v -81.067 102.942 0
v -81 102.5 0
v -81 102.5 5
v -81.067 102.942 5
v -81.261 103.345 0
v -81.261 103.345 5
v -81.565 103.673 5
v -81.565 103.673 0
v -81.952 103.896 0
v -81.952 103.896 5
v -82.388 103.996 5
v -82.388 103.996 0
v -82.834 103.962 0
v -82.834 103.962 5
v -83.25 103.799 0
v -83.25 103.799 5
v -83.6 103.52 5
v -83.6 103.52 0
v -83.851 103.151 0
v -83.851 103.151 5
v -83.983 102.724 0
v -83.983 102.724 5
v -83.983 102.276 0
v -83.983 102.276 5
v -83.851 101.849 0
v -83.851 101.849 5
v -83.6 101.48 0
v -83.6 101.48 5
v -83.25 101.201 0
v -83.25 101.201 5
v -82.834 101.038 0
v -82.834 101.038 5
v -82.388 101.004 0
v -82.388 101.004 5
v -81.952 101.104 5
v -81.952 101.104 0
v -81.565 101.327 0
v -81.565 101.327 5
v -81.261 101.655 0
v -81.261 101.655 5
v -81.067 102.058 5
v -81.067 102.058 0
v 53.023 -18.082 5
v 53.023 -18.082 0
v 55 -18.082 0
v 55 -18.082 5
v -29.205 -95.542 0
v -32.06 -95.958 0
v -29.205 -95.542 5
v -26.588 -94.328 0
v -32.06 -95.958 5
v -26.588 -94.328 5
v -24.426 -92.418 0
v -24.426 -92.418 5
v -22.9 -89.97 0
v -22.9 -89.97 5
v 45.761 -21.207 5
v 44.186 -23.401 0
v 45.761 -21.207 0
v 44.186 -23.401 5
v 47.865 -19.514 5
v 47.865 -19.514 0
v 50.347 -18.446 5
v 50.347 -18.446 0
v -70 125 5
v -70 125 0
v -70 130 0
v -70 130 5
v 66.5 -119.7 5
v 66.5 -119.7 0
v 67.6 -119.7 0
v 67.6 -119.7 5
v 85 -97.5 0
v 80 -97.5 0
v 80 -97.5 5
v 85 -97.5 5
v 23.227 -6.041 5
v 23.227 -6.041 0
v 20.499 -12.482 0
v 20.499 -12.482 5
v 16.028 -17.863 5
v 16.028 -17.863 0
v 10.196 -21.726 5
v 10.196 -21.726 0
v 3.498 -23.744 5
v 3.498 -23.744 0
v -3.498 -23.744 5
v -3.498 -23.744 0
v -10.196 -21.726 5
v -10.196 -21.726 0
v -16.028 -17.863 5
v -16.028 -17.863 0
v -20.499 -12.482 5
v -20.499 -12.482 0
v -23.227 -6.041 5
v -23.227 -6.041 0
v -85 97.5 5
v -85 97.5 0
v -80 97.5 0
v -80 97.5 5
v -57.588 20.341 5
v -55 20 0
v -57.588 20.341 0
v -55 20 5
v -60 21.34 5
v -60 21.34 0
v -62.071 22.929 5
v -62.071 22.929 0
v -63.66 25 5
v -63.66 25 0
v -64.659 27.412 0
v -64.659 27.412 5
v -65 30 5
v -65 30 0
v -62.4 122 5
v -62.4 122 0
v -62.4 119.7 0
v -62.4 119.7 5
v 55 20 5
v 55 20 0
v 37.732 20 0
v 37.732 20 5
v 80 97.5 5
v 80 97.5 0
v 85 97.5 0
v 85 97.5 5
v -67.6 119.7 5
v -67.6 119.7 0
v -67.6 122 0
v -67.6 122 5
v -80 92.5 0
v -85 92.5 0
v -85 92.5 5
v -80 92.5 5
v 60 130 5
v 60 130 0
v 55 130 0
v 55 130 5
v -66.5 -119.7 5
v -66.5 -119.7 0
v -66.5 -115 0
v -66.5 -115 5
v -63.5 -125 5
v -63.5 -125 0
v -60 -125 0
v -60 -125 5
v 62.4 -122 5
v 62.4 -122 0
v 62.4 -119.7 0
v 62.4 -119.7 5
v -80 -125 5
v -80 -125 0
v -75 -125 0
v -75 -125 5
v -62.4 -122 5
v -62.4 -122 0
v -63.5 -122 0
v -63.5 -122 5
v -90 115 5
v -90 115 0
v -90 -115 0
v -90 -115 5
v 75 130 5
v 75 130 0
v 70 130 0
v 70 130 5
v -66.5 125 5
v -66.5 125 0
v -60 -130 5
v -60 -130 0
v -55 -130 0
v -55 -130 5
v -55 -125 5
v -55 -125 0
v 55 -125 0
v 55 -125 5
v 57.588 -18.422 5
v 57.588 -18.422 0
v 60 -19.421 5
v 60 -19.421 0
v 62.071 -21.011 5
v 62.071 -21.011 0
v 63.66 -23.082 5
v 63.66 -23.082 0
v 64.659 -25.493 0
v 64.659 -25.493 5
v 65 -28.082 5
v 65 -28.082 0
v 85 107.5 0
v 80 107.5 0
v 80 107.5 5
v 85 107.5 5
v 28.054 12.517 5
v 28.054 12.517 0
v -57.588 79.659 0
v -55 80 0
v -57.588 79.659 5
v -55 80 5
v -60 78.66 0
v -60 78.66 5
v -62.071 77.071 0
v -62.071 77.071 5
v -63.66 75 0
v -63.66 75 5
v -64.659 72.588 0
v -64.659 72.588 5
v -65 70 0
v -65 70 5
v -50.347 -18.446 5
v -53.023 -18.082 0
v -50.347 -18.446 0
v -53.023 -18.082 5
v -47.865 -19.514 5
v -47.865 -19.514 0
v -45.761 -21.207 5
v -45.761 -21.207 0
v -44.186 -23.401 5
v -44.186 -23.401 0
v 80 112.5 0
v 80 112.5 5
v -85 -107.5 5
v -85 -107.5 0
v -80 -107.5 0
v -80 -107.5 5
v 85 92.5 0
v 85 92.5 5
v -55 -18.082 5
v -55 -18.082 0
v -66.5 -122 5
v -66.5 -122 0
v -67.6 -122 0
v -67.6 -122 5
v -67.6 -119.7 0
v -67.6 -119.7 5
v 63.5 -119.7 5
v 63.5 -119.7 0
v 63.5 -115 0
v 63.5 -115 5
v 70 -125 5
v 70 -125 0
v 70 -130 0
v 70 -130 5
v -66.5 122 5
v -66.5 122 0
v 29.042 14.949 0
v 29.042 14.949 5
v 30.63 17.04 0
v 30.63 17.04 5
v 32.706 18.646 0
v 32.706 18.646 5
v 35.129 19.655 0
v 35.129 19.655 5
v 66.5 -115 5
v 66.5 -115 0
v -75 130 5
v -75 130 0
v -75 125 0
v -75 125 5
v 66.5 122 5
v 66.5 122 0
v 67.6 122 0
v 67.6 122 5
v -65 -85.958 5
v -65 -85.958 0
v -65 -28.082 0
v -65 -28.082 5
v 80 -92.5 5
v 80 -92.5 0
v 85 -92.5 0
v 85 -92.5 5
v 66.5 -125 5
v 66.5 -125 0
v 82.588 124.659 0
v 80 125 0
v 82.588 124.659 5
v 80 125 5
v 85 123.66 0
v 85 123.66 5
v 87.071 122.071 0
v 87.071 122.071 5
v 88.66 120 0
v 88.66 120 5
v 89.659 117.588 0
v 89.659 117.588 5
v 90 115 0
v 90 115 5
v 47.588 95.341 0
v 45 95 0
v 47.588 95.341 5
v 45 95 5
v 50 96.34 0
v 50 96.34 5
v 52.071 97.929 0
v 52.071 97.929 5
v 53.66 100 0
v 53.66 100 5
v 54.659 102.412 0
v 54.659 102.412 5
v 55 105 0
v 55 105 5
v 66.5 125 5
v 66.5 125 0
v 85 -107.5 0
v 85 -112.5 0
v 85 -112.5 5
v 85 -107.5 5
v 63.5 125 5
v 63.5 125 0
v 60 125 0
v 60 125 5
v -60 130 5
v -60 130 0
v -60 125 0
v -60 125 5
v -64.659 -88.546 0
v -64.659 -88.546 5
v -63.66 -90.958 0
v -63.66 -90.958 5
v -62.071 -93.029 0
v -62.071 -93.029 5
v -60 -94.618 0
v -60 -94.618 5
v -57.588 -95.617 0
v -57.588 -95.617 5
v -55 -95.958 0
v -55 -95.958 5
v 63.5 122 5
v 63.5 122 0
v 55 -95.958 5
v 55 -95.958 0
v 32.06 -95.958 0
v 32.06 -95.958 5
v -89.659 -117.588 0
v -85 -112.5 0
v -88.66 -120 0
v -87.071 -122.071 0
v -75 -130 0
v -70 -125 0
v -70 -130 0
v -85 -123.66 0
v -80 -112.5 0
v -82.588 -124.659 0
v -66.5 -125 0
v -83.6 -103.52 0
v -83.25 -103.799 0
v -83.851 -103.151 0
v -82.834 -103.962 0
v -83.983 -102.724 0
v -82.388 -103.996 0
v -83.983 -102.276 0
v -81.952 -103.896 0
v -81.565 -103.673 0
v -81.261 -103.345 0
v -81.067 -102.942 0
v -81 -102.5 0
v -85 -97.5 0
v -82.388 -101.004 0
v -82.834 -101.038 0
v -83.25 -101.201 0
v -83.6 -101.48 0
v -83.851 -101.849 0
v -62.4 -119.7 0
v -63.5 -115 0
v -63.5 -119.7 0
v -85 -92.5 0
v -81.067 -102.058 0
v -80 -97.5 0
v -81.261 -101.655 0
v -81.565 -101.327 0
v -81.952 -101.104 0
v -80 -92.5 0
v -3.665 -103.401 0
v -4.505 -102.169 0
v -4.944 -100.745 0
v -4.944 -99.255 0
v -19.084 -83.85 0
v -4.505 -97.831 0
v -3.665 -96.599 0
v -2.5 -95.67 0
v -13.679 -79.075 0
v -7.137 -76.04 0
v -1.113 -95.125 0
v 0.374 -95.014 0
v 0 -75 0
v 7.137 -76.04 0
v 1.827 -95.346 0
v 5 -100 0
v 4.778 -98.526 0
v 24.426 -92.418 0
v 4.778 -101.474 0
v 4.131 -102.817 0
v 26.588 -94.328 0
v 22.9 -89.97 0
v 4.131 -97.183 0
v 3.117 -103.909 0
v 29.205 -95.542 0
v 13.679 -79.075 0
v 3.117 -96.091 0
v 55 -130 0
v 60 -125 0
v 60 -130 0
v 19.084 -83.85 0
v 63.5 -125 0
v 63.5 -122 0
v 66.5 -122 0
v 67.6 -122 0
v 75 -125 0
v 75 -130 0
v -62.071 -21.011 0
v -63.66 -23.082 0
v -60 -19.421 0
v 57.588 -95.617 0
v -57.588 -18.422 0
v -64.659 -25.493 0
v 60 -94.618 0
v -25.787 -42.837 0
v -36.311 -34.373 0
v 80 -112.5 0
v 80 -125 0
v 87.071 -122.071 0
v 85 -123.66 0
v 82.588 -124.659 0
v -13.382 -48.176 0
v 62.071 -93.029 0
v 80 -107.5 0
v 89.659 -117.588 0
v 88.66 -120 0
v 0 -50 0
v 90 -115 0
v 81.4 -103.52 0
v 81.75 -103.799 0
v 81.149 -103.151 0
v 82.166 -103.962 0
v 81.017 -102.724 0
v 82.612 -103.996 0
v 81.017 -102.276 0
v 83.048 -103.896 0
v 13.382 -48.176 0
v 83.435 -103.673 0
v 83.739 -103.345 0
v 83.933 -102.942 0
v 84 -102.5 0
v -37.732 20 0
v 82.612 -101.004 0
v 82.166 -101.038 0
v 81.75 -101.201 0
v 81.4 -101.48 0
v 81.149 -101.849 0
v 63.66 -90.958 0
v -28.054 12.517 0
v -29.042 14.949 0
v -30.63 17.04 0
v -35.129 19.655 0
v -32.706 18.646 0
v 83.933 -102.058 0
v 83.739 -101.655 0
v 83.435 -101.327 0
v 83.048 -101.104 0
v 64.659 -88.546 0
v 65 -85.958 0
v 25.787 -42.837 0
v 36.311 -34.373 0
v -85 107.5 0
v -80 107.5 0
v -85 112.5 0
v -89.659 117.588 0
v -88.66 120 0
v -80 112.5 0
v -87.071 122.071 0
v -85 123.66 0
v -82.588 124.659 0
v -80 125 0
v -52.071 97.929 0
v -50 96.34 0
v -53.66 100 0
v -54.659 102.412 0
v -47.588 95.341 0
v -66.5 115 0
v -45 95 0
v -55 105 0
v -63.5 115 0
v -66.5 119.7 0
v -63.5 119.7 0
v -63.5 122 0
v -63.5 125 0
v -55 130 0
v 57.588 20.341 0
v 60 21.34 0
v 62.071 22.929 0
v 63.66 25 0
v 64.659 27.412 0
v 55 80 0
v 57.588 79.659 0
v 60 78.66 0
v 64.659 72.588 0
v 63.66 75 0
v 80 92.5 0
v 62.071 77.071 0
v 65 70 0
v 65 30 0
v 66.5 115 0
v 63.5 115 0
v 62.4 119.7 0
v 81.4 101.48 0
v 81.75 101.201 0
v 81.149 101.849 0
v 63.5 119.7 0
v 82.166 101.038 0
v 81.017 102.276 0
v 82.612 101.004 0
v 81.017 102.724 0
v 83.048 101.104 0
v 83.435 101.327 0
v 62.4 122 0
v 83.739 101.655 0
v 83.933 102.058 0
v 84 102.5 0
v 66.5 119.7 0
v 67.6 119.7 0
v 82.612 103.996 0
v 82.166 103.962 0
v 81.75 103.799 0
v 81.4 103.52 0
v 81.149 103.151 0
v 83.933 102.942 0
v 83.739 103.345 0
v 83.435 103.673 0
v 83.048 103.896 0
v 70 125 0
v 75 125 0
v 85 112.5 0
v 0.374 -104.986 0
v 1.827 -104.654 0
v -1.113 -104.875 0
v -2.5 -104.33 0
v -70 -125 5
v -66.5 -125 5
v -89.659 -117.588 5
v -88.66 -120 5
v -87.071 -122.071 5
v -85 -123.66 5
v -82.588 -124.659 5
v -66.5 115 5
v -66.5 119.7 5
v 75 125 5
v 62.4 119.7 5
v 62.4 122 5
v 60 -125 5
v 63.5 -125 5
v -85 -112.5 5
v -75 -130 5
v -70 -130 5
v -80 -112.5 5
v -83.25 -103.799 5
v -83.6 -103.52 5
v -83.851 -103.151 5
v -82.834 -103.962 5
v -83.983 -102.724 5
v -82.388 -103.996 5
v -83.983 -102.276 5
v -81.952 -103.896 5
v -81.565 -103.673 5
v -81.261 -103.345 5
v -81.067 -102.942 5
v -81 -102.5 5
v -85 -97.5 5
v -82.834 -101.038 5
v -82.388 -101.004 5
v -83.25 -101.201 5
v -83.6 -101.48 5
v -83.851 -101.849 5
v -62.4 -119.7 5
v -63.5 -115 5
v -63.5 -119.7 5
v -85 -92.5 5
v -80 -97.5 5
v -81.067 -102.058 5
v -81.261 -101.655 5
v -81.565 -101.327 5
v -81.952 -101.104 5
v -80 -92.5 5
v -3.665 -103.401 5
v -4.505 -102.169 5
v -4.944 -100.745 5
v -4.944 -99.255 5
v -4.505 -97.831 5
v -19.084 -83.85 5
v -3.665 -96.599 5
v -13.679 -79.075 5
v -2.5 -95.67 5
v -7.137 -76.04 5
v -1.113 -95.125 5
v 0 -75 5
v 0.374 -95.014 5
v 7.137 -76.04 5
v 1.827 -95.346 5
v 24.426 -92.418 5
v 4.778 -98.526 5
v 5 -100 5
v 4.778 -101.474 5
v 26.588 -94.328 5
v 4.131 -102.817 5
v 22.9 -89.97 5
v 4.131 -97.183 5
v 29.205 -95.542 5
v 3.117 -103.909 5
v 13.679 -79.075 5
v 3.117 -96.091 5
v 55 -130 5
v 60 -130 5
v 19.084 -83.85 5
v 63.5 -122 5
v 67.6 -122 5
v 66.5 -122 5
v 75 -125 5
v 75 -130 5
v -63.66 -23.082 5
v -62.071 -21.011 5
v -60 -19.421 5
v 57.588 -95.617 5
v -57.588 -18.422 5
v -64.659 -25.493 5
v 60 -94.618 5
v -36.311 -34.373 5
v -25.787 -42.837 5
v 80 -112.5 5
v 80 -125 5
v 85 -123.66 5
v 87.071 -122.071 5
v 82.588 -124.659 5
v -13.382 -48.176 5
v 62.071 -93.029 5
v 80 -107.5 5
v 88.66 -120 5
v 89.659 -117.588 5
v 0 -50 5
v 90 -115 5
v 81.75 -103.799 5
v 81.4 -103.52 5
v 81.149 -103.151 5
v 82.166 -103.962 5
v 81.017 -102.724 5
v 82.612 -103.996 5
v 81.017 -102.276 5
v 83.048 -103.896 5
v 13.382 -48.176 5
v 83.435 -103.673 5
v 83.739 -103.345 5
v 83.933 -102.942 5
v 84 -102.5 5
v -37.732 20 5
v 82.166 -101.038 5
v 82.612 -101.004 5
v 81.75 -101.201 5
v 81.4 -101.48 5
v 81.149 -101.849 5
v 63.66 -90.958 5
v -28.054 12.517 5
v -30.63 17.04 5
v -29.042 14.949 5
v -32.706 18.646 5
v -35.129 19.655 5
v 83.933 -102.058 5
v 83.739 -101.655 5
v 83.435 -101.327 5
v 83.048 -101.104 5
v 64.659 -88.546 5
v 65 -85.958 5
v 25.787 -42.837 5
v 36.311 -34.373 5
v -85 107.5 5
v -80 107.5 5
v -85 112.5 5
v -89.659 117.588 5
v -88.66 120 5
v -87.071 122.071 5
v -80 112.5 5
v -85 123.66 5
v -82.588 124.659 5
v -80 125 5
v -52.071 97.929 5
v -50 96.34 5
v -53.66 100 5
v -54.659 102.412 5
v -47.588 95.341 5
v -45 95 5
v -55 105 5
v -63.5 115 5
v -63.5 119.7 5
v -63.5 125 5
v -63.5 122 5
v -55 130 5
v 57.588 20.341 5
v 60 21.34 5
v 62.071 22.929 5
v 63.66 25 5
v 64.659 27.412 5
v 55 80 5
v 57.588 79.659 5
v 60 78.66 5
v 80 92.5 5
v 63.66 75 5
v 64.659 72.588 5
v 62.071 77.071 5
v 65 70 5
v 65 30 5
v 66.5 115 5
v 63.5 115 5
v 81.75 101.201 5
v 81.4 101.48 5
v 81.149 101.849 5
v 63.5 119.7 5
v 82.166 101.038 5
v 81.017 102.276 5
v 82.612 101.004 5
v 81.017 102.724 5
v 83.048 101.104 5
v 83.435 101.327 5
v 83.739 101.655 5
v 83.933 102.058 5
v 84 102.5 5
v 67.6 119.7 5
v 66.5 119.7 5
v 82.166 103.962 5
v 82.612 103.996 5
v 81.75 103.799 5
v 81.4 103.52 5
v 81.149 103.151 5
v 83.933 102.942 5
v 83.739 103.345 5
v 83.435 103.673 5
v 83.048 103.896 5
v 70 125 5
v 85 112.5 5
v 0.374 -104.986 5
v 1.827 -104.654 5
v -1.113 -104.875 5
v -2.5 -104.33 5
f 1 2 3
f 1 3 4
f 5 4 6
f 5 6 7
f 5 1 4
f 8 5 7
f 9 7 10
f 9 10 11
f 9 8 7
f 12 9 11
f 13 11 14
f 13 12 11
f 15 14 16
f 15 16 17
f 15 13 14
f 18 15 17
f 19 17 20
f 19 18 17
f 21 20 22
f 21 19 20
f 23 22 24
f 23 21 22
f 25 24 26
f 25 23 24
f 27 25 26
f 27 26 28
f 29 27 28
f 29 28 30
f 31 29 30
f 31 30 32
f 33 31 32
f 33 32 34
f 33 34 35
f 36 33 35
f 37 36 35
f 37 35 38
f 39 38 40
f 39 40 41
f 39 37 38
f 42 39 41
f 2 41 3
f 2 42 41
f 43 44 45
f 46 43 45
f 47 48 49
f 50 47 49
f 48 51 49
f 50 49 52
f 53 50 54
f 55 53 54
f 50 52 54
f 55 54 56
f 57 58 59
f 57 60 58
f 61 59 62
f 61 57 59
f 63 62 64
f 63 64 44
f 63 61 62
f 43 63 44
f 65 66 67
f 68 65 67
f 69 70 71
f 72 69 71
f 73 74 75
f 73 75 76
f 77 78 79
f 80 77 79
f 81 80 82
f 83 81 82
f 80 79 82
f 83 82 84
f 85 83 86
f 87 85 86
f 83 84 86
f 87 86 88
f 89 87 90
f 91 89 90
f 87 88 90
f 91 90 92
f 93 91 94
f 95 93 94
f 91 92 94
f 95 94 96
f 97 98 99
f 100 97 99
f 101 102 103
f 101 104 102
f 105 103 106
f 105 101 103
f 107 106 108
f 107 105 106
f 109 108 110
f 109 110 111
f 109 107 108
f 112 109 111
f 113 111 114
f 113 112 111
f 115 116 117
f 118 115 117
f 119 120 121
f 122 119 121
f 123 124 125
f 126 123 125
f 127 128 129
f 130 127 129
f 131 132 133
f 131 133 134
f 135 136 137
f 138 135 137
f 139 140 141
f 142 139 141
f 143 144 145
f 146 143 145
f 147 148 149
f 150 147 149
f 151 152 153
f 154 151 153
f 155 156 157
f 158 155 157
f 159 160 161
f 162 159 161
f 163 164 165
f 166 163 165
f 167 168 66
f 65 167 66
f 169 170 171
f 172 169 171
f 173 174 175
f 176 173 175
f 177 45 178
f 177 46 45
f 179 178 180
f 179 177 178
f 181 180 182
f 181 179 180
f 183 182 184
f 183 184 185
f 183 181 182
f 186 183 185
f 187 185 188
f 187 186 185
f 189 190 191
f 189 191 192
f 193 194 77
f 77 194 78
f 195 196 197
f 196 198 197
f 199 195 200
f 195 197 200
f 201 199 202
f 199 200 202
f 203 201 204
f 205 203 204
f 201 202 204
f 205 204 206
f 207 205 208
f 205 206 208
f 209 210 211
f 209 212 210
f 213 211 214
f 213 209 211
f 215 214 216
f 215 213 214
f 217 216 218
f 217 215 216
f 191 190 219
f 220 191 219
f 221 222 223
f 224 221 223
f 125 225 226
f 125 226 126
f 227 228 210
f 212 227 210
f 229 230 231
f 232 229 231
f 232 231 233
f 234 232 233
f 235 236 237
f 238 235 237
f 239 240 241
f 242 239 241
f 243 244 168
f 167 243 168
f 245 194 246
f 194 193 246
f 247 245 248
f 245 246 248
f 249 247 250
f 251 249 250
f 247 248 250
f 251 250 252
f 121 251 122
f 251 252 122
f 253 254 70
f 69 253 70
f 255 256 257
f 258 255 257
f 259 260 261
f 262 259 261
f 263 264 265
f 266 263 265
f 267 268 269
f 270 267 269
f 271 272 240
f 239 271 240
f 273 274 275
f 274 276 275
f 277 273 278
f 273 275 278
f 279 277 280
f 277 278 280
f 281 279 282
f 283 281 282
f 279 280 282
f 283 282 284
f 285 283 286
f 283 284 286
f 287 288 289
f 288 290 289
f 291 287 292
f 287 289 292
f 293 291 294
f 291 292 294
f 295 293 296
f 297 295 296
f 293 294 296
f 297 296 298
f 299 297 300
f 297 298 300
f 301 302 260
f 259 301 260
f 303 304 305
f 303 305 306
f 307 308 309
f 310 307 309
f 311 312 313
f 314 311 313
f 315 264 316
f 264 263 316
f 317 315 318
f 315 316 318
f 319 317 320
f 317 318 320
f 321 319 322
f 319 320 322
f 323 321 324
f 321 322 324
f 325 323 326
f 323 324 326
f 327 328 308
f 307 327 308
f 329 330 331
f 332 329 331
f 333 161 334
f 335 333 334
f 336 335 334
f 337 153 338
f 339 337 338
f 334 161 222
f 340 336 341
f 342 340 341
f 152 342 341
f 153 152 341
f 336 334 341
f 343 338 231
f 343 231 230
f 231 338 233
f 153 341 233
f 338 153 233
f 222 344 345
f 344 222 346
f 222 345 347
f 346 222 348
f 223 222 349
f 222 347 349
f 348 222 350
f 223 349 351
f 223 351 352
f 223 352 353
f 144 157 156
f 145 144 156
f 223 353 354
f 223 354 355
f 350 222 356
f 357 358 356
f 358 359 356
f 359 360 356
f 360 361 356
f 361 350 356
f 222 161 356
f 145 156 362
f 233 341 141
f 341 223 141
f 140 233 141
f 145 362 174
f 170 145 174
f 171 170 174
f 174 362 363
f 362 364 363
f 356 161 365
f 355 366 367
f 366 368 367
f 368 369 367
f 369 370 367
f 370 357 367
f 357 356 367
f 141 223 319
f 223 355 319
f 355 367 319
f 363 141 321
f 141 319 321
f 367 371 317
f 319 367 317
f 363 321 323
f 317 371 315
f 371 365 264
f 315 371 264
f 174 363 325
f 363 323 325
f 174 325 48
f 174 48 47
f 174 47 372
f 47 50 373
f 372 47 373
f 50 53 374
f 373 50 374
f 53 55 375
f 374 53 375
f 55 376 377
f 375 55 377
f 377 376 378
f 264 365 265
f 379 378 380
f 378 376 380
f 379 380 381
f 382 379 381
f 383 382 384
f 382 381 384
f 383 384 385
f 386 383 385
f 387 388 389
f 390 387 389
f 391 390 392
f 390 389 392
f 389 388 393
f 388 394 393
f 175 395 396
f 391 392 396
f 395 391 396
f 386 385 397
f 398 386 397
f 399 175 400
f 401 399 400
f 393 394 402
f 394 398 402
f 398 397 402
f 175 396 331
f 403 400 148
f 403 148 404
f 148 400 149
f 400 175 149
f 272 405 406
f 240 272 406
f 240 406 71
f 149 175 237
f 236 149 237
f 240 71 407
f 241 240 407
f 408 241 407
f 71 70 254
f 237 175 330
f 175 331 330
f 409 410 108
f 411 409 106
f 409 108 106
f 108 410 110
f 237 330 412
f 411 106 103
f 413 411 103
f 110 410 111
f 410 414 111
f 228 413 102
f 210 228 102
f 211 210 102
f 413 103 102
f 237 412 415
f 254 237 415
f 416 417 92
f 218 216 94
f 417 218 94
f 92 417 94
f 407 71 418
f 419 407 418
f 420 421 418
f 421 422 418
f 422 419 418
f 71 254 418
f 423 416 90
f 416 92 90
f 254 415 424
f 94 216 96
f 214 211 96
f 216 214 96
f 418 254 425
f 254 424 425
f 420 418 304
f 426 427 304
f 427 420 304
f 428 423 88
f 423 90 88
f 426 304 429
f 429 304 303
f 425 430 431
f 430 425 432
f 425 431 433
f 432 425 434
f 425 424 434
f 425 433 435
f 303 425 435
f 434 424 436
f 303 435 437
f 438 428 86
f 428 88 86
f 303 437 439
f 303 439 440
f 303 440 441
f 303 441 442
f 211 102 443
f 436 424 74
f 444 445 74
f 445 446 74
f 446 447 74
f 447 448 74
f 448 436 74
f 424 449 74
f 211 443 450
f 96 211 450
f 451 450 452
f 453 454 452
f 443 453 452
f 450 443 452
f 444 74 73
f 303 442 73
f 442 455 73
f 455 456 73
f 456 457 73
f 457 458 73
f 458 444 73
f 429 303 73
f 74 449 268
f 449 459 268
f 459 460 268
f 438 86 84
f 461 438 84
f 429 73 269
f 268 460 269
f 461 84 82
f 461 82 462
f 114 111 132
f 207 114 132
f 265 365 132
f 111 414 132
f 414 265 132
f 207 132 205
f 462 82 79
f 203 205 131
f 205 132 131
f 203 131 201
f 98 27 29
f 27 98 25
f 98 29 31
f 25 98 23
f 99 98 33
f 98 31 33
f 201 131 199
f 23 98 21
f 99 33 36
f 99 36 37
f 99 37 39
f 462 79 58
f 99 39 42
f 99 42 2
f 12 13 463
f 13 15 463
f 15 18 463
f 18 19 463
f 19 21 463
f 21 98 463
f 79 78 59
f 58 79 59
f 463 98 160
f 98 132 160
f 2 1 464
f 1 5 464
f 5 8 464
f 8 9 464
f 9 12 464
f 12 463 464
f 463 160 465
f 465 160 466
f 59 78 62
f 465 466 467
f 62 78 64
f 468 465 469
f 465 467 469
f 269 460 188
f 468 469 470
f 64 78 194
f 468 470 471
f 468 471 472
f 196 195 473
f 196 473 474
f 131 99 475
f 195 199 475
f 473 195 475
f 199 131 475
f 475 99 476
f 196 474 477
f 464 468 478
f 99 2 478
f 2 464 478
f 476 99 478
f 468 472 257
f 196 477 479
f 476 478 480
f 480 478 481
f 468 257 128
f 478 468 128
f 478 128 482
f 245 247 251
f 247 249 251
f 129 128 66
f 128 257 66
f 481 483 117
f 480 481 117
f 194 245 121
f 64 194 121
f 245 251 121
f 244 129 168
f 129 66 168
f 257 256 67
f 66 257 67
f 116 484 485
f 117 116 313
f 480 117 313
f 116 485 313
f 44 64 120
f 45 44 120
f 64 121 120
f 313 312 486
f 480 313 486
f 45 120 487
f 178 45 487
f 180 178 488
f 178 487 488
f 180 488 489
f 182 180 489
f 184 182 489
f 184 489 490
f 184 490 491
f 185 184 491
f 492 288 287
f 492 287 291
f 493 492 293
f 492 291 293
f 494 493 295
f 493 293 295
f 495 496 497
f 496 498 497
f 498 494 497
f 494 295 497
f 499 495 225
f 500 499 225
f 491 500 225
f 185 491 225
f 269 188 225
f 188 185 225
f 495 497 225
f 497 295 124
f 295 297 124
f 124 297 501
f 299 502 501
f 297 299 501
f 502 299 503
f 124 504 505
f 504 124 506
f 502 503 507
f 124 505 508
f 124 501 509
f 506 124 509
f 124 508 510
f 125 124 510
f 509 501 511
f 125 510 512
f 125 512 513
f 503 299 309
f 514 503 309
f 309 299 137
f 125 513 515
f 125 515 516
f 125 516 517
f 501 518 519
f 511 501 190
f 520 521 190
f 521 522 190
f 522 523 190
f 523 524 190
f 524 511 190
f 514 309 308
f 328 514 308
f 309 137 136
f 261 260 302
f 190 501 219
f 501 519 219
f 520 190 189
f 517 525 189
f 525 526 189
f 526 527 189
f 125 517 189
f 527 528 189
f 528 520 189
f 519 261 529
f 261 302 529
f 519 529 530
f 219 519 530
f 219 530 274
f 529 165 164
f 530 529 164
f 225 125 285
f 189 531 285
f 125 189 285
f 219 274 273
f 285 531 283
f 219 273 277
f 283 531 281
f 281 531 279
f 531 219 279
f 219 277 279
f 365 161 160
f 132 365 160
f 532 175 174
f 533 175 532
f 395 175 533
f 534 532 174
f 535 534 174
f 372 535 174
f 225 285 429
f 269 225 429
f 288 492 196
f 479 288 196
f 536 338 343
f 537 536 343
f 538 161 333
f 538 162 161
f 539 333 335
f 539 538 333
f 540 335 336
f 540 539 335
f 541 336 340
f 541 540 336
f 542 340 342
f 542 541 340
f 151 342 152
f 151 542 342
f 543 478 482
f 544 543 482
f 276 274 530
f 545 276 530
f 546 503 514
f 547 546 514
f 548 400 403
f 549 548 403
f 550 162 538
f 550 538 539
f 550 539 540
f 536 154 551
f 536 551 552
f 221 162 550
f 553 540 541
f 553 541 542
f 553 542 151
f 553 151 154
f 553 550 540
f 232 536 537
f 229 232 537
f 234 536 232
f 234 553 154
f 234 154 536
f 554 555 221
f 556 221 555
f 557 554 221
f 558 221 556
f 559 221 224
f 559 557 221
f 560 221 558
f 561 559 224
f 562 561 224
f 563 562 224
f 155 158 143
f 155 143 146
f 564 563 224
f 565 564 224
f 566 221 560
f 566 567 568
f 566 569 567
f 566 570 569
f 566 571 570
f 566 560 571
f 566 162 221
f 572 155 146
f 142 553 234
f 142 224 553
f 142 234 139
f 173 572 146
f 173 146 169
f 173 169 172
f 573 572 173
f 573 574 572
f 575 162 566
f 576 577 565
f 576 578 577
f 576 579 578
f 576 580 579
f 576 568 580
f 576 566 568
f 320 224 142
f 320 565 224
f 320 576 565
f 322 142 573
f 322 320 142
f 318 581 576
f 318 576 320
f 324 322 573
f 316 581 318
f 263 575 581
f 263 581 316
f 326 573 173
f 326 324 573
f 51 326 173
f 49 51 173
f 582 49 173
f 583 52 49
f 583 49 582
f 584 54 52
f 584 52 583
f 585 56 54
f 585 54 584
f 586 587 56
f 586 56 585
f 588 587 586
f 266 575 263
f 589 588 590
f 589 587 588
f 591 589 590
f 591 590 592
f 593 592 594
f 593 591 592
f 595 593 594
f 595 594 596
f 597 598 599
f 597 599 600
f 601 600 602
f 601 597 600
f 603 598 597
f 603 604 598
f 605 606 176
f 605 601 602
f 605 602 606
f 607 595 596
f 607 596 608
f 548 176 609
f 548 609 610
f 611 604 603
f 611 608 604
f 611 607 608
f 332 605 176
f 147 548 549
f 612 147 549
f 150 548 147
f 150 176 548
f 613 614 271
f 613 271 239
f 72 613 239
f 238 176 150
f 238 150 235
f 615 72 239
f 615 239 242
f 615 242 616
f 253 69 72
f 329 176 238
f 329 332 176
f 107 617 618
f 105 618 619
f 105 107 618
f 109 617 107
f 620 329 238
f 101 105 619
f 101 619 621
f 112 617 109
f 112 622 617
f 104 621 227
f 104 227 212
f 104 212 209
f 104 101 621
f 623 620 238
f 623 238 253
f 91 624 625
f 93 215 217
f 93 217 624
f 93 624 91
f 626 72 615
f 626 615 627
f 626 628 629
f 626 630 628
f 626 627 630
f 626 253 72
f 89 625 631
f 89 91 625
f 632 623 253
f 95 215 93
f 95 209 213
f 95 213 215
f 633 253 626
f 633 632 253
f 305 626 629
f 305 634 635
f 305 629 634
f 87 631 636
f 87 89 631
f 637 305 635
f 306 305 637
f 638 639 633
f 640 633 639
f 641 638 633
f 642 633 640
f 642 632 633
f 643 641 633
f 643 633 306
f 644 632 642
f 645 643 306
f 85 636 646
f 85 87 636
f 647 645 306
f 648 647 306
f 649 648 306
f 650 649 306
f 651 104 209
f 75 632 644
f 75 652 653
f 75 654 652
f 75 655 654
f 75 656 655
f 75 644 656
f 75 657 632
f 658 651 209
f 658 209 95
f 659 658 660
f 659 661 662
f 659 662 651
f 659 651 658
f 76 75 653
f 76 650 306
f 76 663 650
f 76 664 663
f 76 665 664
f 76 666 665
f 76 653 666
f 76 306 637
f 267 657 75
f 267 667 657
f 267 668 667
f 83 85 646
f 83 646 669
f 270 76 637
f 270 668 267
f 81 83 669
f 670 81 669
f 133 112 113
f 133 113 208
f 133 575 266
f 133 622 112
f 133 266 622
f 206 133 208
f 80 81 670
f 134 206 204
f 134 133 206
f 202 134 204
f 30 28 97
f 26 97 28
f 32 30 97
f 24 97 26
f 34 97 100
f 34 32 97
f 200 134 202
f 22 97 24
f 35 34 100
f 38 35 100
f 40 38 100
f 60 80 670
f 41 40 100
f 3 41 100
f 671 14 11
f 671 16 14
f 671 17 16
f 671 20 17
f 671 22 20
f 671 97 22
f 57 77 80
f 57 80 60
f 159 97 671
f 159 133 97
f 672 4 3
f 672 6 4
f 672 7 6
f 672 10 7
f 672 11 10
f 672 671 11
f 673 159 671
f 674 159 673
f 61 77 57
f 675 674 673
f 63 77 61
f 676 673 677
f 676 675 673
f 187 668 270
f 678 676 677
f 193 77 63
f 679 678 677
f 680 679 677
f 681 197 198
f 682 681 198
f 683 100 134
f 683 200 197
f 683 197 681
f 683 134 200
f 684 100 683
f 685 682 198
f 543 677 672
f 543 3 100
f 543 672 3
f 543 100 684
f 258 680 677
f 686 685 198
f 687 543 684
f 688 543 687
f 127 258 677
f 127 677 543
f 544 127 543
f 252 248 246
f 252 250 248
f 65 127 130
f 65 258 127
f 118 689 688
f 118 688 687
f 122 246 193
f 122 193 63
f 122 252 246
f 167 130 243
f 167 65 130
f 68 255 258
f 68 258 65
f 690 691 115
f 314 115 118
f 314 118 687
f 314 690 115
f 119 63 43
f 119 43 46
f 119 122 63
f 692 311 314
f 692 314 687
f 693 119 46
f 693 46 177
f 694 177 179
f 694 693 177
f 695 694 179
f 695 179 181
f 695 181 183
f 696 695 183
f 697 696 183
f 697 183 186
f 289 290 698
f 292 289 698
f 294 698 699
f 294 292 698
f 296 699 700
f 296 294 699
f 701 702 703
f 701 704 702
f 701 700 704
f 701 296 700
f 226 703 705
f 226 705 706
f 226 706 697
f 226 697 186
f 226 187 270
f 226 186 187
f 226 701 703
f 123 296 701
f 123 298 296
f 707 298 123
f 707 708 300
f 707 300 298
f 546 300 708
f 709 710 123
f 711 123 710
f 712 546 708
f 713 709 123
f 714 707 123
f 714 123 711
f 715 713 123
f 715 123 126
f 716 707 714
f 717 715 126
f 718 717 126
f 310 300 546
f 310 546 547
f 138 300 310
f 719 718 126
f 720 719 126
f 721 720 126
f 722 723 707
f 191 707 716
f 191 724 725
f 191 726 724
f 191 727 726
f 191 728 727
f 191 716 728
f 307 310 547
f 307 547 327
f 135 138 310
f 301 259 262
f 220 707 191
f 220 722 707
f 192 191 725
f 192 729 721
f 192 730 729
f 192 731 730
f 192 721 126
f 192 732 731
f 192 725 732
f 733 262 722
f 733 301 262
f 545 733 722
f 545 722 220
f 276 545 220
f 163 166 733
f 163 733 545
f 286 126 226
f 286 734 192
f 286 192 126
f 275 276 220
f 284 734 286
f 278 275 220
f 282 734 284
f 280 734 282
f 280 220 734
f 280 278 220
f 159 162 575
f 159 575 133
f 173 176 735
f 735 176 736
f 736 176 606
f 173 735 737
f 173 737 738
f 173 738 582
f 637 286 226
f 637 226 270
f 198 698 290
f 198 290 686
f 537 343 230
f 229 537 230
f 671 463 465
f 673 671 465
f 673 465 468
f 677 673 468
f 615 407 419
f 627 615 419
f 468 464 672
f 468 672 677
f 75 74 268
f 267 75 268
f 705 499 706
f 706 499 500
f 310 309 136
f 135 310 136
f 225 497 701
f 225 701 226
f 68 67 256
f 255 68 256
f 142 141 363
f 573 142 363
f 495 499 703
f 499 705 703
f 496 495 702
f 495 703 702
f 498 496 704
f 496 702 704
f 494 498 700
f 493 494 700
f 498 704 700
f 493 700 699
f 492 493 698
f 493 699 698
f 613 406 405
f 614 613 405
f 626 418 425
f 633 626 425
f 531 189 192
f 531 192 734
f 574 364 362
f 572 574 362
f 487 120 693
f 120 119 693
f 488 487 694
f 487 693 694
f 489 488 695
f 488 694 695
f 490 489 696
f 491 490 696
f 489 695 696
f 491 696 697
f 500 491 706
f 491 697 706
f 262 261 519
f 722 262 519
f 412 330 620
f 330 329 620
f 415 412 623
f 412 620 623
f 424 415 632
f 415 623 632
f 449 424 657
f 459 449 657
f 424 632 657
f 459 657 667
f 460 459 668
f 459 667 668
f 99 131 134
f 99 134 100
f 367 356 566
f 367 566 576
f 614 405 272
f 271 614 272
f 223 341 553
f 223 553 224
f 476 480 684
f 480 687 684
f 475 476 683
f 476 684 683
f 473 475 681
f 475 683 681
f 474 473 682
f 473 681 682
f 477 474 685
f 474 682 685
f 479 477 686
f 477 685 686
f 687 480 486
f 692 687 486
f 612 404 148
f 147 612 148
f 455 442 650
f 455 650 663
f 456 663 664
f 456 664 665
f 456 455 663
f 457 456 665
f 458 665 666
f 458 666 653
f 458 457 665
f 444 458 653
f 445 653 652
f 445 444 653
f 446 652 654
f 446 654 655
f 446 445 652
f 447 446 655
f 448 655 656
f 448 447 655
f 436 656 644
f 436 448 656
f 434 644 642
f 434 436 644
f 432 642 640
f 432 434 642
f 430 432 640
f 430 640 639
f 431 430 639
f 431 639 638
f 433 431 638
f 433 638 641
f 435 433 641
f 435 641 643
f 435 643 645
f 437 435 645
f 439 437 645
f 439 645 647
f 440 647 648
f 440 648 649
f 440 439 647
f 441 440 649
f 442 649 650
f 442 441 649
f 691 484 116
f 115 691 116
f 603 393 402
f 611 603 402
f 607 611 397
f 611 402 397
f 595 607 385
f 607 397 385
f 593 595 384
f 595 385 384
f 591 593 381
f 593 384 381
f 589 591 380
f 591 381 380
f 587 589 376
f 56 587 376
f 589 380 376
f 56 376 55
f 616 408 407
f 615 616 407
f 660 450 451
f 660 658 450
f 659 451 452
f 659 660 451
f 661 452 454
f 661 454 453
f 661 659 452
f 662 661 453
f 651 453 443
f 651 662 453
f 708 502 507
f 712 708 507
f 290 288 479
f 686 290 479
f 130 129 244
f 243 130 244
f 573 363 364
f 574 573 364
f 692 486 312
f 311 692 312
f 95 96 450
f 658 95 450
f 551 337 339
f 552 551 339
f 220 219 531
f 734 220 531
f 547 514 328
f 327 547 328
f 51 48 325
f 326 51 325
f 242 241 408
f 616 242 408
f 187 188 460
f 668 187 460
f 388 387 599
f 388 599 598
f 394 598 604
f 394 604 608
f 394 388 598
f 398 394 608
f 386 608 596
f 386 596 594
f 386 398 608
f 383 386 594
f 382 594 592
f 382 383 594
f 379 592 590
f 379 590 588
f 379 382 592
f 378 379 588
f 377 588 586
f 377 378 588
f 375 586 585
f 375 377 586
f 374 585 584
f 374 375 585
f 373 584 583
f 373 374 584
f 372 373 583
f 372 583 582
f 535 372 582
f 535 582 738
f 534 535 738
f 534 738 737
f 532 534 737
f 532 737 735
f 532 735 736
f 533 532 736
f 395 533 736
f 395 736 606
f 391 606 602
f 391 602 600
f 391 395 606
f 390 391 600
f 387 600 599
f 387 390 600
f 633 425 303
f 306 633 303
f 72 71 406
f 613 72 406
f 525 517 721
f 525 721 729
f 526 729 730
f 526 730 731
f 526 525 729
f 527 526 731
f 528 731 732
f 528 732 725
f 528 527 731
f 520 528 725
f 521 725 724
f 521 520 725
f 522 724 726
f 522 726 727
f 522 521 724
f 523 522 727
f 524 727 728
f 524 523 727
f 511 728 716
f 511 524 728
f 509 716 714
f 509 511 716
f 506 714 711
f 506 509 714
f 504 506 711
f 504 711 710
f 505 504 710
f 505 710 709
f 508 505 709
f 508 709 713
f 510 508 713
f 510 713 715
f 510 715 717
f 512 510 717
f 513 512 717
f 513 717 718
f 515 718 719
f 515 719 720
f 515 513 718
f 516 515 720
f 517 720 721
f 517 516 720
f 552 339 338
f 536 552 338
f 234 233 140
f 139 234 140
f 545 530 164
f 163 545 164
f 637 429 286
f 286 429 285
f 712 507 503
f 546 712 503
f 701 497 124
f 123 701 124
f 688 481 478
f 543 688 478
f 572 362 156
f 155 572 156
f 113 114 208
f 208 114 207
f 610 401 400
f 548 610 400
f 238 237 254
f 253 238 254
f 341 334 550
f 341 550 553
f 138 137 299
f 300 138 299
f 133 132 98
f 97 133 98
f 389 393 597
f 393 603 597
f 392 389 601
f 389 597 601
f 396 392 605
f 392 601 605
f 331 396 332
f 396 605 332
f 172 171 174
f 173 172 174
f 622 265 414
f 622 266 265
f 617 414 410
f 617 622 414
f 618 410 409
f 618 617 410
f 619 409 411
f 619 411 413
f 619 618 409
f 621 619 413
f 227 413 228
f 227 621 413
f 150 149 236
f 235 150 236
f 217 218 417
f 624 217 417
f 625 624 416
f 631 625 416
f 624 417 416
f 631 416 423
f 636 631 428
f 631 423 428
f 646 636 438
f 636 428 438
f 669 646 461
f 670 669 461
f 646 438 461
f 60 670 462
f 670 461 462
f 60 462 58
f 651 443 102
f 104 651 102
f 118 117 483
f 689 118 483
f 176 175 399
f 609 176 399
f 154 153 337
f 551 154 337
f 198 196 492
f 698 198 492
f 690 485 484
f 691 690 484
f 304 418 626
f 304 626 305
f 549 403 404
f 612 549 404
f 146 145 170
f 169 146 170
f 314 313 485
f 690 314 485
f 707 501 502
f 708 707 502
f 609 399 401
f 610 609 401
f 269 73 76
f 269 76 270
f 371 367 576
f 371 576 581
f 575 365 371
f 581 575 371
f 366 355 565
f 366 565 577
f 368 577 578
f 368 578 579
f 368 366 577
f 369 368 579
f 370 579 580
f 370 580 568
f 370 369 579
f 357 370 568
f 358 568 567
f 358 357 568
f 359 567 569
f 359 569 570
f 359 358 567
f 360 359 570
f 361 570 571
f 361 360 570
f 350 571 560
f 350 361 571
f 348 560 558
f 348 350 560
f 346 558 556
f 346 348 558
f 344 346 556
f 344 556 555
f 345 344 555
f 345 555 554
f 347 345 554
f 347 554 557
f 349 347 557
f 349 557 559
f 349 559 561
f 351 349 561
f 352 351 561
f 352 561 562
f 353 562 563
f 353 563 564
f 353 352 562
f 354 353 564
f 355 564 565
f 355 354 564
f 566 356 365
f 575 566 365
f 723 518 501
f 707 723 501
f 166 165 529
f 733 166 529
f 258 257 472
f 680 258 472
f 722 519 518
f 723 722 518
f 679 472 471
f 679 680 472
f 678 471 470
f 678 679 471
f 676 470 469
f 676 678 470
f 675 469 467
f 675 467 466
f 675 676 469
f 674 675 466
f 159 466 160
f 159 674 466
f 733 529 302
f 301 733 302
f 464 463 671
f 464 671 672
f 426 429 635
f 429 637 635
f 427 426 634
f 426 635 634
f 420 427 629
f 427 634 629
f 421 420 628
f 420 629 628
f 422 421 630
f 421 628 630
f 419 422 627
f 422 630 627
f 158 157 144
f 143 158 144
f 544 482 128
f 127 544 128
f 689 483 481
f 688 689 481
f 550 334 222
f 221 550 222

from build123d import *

# Parameters (mm, degrees)
SKETCH1_W           = 5
SKETCH1_H           = 5
SKETCH1_R           = 1.5
SKETCH1_R_2         = 5
BOSS_EXTRUDE1_DEPTH = 5
FILLET1_R           = 10


with BuildPart() as part:
    # Sketch1 → Boss-Extrude1 (new body)
    with BuildSketch(Plane.XY):
        Polygon((-75, 125), (-90, 125), (-90, -125), (-75, -125), (-75, -130), (-70, -130), (-70, -125), (-66.5, -125), (-66.5, -122), (-67.6, -122), (-67.6, -119.7), (-66.5, -119.7), (-66.5, -115), (-63.5, -115), (-63.5, -119.7), (-62.4, -119.7), (-62.4, -122), (-63.5, -122), (-63.5, -125), (-60, -125), (-60, -130), (-55, -130), (-55, -125), (55, -125), (55, -130), (60, -130), (60, -125), (63.5, -125), (63.5, -122), (62.4, -122), (62.4, -119.7), (63.5, -119.7), (63.5, -115), (66.5, -115), (66.5, -119.7), (67.6, -119.7), (67.6, -122), (66.5, -122), (66.5, -125), (70, -125), (70, -130), (75, -130), (75, -125), (90, -125), (90, 125), (75, 125), (75, 130), (70, 130), (70, 125), (66.5, 125), (66.5, 122), (67.6, 122), (67.6, 119.7), (66.5, 119.7), (66.5, 115), (63.5, 115), (63.5, 119.7), (62.4, 119.7), (62.4, 122), (63.5, 122), (63.5, 125), (60, 125), (60, 130), (55, 130), (55, 95), (-55, 95), (-55, 130), (-60, 130), (-60, 125), (-63.5, 125), (-63.5, 122), (-62.4, 122), (-62.4, 119.7), (-63.5, 119.7), (-63.5, 115), (-66.5, 115), (-66.5, 119.7), (-67.6, 119.7), (-67.6, 122), (-66.5, 122), (-66.5, 125), (-70, 125), (-70, 130), (-75, 130), align=None)
        with Locations((-82.5, -110)):
            Rectangle(SKETCH1_W, SKETCH1_H, mode=Mode.SUBTRACT)
        with Locations((-82.5, -102.5)):
            Circle(SKETCH1_R, mode=Mode.SUBTRACT)
        with Locations((-82.5, -95)):
            Rectangle(SKETCH1_W, SKETCH1_H, mode=Mode.SUBTRACT)
        with Locations((0, -100)):
            Circle(SKETCH1_R_2, mode=Mode.SUBTRACT)
        with Locations((82.5, -110)):
            Rectangle(SKETCH1_W, SKETCH1_H, mode=Mode.SUBTRACT)
        with Locations((82.5, -102.5)):
            Circle(SKETCH1_R, mode=Mode.SUBTRACT)
        with Locations((82.5, -95)):
            Rectangle(SKETCH1_W, SKETCH1_H, mode=Mode.SUBTRACT)
        with BuildLine():
            Line((-65, -18.081635275), (-46.616032283, -18.081635275))
            ThreePointArc((-46.616032283, -18.081635275), (0, -50), (46.616032283, -18.081635275))
            Line((46.616032283, -18.081635275), (65, -18.081635275))
            Line((65, -18.081635275), (65, -95.958016924))
            Line((65, -95.958016924), (24.671083738, -95.958016924))
            ThreePointArc((24.671083738, -95.958016924), (0, -75), (-24.671083738, -95.958016924))
            Line((-24.671083738, -95.958016924), (-65, -95.958016924))
            Line((-65, -95.958016924), (-65, -18.081635275))
        make_face(mode=Mode.SUBTRACT)
        with Locations((-82.5, 95)):
            Rectangle(SKETCH1_W, SKETCH1_H, mode=Mode.SUBTRACT)
        with Locations((-82.5, 102.5)):
            Circle(SKETCH1_R, mode=Mode.SUBTRACT)
        with Locations((-82.5, 110)):
            Rectangle(SKETCH1_W, SKETCH1_H, mode=Mode.SUBTRACT)
        with BuildLine():
            ThreePointArc((23.227291604, -6.040937406), (0, -24), (-23.227291604, -6.040937406))
            Line((-23.227291604, -6.040937406), (-30, 20))
            Line((-30, 20), (-65, 20))
            Line((-65, 20), (-65, 80))
            Line((-65, 80), (65, 80))
            Line((65, 80), (65, 20))
            Line((65, 20), (30, 20))
            Line((30, 20), (23.227291604, -6.040937406))
        make_face(mode=Mode.SUBTRACT)
        with Locations((82.5, 95)):
            Rectangle(SKETCH1_W, SKETCH1_H, mode=Mode.SUBTRACT)
        with Locations((82.5, 102.5)):
            Circle(SKETCH1_R, mode=Mode.SUBTRACT)
        with Locations((82.5, 110)):
            Rectangle(SKETCH1_W, SKETCH1_H, mode=Mode.SUBTRACT)
    extrude(amount=BOSS_EXTRUDE1_DEPTH)

    # Fillet1
    fillet1_edges = [part.edges().sort_by_distance(p)[0] for p in [
        (-65, -18.081635275, 2.5),
        (-65, -95.958016924, 2.5),
        (-24.671083738, -95.958016924, 2.5),
        (24.671083738, -95.958016924, 2.5),
        (65, -95.958016924, 2.5),
        (65, -18.081635275, 2.5),
        (46.616032283, -18.081635275, 2.5),
        (-46.616032283, -18.081635275, 2.5),
        (30, 20, 2.5),
        (65, 20, 2.5),
        (65, 80, 2.5),
        (-65, 80, 2.5),
        (-65, 20, 2.5),
        (-30, 20, 2.5),
        (-55, 95, 2.5),
        (55, 95, 2.5),
        (90, 125, 2.5),
        (90, -125, 2.5),
        (-90, -125, 2.5),
        (-90, 125, 2.5),
    ]]
    fillet(fillet1_edges, radius=FILLET1_R)


solid = part.part
